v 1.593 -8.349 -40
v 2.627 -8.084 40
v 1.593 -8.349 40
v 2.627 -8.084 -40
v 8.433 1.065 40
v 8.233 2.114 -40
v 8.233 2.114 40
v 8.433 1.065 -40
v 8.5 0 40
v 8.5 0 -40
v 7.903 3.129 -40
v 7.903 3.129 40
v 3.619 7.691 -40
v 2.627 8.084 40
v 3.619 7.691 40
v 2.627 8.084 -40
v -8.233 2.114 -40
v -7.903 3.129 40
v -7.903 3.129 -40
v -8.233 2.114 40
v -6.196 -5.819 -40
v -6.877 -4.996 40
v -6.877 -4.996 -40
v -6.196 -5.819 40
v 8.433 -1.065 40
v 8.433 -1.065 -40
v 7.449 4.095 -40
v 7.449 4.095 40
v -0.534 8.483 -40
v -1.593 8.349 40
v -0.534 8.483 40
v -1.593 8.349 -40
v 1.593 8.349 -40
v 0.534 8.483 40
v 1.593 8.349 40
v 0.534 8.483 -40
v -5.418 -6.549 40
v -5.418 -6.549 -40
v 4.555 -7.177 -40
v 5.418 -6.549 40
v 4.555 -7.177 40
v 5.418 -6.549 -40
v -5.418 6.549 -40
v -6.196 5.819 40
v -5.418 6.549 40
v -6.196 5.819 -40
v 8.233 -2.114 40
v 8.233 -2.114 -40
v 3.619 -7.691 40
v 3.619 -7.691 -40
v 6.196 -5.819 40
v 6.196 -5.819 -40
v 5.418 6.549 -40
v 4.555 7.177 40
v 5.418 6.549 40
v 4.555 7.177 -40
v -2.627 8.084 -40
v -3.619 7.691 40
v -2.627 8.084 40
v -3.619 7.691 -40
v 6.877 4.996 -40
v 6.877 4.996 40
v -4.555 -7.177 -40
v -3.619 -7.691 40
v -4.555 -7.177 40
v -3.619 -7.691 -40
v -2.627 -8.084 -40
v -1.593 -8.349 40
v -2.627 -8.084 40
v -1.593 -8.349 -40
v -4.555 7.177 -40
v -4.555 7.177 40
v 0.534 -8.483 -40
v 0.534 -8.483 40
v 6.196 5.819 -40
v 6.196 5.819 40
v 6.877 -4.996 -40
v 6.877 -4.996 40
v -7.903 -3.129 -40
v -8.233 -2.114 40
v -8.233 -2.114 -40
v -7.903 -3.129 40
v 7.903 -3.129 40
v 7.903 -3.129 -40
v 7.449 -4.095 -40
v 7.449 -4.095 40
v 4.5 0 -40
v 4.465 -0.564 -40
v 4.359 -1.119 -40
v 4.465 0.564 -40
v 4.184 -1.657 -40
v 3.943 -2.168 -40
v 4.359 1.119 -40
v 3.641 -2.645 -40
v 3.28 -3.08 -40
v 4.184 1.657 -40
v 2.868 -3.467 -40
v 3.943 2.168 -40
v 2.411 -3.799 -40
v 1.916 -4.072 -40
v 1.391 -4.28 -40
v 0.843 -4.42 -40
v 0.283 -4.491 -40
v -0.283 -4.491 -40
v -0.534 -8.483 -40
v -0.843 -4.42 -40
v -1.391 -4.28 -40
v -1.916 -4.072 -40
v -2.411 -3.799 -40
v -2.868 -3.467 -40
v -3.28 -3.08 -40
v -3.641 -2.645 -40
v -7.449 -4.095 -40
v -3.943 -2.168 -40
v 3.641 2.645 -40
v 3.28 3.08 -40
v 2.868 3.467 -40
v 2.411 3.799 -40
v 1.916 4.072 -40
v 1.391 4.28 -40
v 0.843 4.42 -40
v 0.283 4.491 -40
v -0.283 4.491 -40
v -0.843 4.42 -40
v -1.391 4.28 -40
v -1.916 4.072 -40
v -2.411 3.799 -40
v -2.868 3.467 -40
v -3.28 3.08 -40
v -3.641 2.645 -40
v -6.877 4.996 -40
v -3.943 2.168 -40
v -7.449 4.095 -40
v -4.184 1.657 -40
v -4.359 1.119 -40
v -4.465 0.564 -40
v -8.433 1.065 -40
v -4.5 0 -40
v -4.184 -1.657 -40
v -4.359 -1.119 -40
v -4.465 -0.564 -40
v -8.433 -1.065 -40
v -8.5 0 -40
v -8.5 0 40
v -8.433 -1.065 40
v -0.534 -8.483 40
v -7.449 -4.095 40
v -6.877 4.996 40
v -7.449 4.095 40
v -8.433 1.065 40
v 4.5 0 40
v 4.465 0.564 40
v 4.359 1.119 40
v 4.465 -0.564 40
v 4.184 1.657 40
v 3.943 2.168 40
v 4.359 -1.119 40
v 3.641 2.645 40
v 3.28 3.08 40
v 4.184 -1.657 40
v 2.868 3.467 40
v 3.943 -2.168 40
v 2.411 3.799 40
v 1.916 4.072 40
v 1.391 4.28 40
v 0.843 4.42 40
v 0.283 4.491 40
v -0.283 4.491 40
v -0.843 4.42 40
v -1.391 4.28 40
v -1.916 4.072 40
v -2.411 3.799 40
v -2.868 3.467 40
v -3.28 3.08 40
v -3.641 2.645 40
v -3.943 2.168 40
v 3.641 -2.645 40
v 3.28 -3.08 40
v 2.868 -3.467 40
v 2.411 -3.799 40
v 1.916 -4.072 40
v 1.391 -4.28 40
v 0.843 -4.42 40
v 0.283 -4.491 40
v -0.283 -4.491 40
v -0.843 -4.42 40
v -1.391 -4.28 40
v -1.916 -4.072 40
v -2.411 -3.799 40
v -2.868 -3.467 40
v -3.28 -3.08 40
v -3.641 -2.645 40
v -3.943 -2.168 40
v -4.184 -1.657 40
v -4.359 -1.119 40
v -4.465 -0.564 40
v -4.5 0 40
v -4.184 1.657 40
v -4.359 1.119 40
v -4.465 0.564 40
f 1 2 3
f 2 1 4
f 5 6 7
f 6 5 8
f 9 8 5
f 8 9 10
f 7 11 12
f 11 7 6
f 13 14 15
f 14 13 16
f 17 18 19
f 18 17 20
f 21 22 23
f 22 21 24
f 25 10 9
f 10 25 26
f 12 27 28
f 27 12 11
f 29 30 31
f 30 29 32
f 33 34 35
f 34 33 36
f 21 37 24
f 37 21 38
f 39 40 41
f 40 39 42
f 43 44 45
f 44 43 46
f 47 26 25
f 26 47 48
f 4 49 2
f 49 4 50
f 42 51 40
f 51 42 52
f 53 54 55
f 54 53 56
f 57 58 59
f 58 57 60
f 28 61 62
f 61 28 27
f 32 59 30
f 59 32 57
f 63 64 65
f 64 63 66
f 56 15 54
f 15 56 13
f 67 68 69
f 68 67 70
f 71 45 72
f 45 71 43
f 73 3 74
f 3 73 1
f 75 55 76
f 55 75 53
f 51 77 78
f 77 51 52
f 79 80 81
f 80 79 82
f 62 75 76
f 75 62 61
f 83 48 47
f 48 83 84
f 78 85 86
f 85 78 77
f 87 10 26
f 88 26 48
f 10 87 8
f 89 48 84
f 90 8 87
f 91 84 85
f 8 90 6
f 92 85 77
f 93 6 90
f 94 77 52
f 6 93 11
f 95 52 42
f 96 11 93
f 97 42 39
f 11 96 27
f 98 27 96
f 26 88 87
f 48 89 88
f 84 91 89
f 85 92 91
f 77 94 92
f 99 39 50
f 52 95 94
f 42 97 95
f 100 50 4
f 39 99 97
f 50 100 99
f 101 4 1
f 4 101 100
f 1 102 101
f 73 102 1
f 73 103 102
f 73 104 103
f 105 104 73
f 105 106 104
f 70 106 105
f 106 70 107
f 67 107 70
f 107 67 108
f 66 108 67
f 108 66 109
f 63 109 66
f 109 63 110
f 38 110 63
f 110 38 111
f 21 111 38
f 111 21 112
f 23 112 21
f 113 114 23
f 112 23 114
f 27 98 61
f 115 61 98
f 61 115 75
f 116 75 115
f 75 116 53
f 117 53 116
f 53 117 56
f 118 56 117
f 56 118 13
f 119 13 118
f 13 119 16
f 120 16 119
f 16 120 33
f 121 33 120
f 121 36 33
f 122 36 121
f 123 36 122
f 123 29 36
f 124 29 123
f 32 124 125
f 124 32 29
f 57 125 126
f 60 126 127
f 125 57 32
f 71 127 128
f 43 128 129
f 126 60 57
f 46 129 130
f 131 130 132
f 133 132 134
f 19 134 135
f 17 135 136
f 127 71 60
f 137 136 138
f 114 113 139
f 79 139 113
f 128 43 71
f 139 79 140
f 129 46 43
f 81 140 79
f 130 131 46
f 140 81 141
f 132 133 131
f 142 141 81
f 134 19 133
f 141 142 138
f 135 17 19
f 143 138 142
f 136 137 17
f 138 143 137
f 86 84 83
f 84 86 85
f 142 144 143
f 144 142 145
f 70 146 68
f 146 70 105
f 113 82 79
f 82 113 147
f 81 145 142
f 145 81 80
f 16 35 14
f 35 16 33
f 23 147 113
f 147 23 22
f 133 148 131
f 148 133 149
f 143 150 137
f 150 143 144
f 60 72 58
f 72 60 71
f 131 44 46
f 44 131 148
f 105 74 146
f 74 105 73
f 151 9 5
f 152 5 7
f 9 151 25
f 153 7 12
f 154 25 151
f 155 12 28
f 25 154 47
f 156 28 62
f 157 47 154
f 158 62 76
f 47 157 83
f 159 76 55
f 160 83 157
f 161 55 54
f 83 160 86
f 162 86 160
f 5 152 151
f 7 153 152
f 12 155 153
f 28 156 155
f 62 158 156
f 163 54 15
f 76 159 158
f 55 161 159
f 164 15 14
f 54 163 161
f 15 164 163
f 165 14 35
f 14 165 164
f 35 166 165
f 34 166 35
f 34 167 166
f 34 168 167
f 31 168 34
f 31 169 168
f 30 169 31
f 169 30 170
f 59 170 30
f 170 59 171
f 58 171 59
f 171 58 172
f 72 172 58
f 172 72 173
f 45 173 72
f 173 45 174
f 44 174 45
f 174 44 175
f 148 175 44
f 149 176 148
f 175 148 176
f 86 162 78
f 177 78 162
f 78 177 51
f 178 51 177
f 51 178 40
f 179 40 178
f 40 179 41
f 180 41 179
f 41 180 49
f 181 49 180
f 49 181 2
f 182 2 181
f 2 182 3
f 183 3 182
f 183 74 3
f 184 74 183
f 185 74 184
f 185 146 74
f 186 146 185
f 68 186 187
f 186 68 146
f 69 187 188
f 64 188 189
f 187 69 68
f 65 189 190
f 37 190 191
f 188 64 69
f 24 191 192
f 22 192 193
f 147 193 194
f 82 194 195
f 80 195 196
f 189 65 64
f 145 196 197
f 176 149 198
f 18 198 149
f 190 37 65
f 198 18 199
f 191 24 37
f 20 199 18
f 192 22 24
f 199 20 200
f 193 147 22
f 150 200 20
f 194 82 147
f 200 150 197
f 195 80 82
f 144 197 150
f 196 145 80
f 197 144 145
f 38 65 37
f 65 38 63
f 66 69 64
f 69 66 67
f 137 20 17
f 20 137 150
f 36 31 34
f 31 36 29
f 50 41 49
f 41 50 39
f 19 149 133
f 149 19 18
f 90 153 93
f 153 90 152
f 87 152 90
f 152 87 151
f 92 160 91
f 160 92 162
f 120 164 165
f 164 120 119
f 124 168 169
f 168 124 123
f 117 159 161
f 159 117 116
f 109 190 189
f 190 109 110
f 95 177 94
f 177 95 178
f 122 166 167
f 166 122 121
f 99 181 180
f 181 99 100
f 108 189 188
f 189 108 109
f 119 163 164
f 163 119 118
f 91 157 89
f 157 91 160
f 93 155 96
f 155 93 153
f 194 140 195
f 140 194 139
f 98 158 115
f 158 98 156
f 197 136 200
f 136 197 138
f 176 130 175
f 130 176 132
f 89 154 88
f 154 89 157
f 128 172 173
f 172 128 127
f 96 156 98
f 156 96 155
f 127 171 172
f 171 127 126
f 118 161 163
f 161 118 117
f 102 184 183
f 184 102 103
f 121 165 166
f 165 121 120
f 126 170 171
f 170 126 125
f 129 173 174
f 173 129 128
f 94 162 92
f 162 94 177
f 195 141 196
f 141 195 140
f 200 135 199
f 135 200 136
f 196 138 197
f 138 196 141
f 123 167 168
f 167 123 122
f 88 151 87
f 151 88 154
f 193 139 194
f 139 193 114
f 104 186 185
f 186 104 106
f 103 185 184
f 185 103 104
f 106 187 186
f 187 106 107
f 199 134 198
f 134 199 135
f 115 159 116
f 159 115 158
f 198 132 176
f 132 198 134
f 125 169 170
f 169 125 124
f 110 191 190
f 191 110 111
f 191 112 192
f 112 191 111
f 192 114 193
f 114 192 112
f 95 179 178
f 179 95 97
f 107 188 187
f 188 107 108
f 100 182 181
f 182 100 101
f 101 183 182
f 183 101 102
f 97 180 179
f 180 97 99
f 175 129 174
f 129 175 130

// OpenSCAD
$fn = 50;


difference() {
	union() {
		translate(v = [0, 0, -40.0000000000]) {
			cylinder(h = 80, r = 8.5000000000);
		}
	}
	union() {
		translate(v = [0, 0, -100.0000000000]) {
			cylinder(h = 200, r = 4.5000000000);
		}
	}
}
